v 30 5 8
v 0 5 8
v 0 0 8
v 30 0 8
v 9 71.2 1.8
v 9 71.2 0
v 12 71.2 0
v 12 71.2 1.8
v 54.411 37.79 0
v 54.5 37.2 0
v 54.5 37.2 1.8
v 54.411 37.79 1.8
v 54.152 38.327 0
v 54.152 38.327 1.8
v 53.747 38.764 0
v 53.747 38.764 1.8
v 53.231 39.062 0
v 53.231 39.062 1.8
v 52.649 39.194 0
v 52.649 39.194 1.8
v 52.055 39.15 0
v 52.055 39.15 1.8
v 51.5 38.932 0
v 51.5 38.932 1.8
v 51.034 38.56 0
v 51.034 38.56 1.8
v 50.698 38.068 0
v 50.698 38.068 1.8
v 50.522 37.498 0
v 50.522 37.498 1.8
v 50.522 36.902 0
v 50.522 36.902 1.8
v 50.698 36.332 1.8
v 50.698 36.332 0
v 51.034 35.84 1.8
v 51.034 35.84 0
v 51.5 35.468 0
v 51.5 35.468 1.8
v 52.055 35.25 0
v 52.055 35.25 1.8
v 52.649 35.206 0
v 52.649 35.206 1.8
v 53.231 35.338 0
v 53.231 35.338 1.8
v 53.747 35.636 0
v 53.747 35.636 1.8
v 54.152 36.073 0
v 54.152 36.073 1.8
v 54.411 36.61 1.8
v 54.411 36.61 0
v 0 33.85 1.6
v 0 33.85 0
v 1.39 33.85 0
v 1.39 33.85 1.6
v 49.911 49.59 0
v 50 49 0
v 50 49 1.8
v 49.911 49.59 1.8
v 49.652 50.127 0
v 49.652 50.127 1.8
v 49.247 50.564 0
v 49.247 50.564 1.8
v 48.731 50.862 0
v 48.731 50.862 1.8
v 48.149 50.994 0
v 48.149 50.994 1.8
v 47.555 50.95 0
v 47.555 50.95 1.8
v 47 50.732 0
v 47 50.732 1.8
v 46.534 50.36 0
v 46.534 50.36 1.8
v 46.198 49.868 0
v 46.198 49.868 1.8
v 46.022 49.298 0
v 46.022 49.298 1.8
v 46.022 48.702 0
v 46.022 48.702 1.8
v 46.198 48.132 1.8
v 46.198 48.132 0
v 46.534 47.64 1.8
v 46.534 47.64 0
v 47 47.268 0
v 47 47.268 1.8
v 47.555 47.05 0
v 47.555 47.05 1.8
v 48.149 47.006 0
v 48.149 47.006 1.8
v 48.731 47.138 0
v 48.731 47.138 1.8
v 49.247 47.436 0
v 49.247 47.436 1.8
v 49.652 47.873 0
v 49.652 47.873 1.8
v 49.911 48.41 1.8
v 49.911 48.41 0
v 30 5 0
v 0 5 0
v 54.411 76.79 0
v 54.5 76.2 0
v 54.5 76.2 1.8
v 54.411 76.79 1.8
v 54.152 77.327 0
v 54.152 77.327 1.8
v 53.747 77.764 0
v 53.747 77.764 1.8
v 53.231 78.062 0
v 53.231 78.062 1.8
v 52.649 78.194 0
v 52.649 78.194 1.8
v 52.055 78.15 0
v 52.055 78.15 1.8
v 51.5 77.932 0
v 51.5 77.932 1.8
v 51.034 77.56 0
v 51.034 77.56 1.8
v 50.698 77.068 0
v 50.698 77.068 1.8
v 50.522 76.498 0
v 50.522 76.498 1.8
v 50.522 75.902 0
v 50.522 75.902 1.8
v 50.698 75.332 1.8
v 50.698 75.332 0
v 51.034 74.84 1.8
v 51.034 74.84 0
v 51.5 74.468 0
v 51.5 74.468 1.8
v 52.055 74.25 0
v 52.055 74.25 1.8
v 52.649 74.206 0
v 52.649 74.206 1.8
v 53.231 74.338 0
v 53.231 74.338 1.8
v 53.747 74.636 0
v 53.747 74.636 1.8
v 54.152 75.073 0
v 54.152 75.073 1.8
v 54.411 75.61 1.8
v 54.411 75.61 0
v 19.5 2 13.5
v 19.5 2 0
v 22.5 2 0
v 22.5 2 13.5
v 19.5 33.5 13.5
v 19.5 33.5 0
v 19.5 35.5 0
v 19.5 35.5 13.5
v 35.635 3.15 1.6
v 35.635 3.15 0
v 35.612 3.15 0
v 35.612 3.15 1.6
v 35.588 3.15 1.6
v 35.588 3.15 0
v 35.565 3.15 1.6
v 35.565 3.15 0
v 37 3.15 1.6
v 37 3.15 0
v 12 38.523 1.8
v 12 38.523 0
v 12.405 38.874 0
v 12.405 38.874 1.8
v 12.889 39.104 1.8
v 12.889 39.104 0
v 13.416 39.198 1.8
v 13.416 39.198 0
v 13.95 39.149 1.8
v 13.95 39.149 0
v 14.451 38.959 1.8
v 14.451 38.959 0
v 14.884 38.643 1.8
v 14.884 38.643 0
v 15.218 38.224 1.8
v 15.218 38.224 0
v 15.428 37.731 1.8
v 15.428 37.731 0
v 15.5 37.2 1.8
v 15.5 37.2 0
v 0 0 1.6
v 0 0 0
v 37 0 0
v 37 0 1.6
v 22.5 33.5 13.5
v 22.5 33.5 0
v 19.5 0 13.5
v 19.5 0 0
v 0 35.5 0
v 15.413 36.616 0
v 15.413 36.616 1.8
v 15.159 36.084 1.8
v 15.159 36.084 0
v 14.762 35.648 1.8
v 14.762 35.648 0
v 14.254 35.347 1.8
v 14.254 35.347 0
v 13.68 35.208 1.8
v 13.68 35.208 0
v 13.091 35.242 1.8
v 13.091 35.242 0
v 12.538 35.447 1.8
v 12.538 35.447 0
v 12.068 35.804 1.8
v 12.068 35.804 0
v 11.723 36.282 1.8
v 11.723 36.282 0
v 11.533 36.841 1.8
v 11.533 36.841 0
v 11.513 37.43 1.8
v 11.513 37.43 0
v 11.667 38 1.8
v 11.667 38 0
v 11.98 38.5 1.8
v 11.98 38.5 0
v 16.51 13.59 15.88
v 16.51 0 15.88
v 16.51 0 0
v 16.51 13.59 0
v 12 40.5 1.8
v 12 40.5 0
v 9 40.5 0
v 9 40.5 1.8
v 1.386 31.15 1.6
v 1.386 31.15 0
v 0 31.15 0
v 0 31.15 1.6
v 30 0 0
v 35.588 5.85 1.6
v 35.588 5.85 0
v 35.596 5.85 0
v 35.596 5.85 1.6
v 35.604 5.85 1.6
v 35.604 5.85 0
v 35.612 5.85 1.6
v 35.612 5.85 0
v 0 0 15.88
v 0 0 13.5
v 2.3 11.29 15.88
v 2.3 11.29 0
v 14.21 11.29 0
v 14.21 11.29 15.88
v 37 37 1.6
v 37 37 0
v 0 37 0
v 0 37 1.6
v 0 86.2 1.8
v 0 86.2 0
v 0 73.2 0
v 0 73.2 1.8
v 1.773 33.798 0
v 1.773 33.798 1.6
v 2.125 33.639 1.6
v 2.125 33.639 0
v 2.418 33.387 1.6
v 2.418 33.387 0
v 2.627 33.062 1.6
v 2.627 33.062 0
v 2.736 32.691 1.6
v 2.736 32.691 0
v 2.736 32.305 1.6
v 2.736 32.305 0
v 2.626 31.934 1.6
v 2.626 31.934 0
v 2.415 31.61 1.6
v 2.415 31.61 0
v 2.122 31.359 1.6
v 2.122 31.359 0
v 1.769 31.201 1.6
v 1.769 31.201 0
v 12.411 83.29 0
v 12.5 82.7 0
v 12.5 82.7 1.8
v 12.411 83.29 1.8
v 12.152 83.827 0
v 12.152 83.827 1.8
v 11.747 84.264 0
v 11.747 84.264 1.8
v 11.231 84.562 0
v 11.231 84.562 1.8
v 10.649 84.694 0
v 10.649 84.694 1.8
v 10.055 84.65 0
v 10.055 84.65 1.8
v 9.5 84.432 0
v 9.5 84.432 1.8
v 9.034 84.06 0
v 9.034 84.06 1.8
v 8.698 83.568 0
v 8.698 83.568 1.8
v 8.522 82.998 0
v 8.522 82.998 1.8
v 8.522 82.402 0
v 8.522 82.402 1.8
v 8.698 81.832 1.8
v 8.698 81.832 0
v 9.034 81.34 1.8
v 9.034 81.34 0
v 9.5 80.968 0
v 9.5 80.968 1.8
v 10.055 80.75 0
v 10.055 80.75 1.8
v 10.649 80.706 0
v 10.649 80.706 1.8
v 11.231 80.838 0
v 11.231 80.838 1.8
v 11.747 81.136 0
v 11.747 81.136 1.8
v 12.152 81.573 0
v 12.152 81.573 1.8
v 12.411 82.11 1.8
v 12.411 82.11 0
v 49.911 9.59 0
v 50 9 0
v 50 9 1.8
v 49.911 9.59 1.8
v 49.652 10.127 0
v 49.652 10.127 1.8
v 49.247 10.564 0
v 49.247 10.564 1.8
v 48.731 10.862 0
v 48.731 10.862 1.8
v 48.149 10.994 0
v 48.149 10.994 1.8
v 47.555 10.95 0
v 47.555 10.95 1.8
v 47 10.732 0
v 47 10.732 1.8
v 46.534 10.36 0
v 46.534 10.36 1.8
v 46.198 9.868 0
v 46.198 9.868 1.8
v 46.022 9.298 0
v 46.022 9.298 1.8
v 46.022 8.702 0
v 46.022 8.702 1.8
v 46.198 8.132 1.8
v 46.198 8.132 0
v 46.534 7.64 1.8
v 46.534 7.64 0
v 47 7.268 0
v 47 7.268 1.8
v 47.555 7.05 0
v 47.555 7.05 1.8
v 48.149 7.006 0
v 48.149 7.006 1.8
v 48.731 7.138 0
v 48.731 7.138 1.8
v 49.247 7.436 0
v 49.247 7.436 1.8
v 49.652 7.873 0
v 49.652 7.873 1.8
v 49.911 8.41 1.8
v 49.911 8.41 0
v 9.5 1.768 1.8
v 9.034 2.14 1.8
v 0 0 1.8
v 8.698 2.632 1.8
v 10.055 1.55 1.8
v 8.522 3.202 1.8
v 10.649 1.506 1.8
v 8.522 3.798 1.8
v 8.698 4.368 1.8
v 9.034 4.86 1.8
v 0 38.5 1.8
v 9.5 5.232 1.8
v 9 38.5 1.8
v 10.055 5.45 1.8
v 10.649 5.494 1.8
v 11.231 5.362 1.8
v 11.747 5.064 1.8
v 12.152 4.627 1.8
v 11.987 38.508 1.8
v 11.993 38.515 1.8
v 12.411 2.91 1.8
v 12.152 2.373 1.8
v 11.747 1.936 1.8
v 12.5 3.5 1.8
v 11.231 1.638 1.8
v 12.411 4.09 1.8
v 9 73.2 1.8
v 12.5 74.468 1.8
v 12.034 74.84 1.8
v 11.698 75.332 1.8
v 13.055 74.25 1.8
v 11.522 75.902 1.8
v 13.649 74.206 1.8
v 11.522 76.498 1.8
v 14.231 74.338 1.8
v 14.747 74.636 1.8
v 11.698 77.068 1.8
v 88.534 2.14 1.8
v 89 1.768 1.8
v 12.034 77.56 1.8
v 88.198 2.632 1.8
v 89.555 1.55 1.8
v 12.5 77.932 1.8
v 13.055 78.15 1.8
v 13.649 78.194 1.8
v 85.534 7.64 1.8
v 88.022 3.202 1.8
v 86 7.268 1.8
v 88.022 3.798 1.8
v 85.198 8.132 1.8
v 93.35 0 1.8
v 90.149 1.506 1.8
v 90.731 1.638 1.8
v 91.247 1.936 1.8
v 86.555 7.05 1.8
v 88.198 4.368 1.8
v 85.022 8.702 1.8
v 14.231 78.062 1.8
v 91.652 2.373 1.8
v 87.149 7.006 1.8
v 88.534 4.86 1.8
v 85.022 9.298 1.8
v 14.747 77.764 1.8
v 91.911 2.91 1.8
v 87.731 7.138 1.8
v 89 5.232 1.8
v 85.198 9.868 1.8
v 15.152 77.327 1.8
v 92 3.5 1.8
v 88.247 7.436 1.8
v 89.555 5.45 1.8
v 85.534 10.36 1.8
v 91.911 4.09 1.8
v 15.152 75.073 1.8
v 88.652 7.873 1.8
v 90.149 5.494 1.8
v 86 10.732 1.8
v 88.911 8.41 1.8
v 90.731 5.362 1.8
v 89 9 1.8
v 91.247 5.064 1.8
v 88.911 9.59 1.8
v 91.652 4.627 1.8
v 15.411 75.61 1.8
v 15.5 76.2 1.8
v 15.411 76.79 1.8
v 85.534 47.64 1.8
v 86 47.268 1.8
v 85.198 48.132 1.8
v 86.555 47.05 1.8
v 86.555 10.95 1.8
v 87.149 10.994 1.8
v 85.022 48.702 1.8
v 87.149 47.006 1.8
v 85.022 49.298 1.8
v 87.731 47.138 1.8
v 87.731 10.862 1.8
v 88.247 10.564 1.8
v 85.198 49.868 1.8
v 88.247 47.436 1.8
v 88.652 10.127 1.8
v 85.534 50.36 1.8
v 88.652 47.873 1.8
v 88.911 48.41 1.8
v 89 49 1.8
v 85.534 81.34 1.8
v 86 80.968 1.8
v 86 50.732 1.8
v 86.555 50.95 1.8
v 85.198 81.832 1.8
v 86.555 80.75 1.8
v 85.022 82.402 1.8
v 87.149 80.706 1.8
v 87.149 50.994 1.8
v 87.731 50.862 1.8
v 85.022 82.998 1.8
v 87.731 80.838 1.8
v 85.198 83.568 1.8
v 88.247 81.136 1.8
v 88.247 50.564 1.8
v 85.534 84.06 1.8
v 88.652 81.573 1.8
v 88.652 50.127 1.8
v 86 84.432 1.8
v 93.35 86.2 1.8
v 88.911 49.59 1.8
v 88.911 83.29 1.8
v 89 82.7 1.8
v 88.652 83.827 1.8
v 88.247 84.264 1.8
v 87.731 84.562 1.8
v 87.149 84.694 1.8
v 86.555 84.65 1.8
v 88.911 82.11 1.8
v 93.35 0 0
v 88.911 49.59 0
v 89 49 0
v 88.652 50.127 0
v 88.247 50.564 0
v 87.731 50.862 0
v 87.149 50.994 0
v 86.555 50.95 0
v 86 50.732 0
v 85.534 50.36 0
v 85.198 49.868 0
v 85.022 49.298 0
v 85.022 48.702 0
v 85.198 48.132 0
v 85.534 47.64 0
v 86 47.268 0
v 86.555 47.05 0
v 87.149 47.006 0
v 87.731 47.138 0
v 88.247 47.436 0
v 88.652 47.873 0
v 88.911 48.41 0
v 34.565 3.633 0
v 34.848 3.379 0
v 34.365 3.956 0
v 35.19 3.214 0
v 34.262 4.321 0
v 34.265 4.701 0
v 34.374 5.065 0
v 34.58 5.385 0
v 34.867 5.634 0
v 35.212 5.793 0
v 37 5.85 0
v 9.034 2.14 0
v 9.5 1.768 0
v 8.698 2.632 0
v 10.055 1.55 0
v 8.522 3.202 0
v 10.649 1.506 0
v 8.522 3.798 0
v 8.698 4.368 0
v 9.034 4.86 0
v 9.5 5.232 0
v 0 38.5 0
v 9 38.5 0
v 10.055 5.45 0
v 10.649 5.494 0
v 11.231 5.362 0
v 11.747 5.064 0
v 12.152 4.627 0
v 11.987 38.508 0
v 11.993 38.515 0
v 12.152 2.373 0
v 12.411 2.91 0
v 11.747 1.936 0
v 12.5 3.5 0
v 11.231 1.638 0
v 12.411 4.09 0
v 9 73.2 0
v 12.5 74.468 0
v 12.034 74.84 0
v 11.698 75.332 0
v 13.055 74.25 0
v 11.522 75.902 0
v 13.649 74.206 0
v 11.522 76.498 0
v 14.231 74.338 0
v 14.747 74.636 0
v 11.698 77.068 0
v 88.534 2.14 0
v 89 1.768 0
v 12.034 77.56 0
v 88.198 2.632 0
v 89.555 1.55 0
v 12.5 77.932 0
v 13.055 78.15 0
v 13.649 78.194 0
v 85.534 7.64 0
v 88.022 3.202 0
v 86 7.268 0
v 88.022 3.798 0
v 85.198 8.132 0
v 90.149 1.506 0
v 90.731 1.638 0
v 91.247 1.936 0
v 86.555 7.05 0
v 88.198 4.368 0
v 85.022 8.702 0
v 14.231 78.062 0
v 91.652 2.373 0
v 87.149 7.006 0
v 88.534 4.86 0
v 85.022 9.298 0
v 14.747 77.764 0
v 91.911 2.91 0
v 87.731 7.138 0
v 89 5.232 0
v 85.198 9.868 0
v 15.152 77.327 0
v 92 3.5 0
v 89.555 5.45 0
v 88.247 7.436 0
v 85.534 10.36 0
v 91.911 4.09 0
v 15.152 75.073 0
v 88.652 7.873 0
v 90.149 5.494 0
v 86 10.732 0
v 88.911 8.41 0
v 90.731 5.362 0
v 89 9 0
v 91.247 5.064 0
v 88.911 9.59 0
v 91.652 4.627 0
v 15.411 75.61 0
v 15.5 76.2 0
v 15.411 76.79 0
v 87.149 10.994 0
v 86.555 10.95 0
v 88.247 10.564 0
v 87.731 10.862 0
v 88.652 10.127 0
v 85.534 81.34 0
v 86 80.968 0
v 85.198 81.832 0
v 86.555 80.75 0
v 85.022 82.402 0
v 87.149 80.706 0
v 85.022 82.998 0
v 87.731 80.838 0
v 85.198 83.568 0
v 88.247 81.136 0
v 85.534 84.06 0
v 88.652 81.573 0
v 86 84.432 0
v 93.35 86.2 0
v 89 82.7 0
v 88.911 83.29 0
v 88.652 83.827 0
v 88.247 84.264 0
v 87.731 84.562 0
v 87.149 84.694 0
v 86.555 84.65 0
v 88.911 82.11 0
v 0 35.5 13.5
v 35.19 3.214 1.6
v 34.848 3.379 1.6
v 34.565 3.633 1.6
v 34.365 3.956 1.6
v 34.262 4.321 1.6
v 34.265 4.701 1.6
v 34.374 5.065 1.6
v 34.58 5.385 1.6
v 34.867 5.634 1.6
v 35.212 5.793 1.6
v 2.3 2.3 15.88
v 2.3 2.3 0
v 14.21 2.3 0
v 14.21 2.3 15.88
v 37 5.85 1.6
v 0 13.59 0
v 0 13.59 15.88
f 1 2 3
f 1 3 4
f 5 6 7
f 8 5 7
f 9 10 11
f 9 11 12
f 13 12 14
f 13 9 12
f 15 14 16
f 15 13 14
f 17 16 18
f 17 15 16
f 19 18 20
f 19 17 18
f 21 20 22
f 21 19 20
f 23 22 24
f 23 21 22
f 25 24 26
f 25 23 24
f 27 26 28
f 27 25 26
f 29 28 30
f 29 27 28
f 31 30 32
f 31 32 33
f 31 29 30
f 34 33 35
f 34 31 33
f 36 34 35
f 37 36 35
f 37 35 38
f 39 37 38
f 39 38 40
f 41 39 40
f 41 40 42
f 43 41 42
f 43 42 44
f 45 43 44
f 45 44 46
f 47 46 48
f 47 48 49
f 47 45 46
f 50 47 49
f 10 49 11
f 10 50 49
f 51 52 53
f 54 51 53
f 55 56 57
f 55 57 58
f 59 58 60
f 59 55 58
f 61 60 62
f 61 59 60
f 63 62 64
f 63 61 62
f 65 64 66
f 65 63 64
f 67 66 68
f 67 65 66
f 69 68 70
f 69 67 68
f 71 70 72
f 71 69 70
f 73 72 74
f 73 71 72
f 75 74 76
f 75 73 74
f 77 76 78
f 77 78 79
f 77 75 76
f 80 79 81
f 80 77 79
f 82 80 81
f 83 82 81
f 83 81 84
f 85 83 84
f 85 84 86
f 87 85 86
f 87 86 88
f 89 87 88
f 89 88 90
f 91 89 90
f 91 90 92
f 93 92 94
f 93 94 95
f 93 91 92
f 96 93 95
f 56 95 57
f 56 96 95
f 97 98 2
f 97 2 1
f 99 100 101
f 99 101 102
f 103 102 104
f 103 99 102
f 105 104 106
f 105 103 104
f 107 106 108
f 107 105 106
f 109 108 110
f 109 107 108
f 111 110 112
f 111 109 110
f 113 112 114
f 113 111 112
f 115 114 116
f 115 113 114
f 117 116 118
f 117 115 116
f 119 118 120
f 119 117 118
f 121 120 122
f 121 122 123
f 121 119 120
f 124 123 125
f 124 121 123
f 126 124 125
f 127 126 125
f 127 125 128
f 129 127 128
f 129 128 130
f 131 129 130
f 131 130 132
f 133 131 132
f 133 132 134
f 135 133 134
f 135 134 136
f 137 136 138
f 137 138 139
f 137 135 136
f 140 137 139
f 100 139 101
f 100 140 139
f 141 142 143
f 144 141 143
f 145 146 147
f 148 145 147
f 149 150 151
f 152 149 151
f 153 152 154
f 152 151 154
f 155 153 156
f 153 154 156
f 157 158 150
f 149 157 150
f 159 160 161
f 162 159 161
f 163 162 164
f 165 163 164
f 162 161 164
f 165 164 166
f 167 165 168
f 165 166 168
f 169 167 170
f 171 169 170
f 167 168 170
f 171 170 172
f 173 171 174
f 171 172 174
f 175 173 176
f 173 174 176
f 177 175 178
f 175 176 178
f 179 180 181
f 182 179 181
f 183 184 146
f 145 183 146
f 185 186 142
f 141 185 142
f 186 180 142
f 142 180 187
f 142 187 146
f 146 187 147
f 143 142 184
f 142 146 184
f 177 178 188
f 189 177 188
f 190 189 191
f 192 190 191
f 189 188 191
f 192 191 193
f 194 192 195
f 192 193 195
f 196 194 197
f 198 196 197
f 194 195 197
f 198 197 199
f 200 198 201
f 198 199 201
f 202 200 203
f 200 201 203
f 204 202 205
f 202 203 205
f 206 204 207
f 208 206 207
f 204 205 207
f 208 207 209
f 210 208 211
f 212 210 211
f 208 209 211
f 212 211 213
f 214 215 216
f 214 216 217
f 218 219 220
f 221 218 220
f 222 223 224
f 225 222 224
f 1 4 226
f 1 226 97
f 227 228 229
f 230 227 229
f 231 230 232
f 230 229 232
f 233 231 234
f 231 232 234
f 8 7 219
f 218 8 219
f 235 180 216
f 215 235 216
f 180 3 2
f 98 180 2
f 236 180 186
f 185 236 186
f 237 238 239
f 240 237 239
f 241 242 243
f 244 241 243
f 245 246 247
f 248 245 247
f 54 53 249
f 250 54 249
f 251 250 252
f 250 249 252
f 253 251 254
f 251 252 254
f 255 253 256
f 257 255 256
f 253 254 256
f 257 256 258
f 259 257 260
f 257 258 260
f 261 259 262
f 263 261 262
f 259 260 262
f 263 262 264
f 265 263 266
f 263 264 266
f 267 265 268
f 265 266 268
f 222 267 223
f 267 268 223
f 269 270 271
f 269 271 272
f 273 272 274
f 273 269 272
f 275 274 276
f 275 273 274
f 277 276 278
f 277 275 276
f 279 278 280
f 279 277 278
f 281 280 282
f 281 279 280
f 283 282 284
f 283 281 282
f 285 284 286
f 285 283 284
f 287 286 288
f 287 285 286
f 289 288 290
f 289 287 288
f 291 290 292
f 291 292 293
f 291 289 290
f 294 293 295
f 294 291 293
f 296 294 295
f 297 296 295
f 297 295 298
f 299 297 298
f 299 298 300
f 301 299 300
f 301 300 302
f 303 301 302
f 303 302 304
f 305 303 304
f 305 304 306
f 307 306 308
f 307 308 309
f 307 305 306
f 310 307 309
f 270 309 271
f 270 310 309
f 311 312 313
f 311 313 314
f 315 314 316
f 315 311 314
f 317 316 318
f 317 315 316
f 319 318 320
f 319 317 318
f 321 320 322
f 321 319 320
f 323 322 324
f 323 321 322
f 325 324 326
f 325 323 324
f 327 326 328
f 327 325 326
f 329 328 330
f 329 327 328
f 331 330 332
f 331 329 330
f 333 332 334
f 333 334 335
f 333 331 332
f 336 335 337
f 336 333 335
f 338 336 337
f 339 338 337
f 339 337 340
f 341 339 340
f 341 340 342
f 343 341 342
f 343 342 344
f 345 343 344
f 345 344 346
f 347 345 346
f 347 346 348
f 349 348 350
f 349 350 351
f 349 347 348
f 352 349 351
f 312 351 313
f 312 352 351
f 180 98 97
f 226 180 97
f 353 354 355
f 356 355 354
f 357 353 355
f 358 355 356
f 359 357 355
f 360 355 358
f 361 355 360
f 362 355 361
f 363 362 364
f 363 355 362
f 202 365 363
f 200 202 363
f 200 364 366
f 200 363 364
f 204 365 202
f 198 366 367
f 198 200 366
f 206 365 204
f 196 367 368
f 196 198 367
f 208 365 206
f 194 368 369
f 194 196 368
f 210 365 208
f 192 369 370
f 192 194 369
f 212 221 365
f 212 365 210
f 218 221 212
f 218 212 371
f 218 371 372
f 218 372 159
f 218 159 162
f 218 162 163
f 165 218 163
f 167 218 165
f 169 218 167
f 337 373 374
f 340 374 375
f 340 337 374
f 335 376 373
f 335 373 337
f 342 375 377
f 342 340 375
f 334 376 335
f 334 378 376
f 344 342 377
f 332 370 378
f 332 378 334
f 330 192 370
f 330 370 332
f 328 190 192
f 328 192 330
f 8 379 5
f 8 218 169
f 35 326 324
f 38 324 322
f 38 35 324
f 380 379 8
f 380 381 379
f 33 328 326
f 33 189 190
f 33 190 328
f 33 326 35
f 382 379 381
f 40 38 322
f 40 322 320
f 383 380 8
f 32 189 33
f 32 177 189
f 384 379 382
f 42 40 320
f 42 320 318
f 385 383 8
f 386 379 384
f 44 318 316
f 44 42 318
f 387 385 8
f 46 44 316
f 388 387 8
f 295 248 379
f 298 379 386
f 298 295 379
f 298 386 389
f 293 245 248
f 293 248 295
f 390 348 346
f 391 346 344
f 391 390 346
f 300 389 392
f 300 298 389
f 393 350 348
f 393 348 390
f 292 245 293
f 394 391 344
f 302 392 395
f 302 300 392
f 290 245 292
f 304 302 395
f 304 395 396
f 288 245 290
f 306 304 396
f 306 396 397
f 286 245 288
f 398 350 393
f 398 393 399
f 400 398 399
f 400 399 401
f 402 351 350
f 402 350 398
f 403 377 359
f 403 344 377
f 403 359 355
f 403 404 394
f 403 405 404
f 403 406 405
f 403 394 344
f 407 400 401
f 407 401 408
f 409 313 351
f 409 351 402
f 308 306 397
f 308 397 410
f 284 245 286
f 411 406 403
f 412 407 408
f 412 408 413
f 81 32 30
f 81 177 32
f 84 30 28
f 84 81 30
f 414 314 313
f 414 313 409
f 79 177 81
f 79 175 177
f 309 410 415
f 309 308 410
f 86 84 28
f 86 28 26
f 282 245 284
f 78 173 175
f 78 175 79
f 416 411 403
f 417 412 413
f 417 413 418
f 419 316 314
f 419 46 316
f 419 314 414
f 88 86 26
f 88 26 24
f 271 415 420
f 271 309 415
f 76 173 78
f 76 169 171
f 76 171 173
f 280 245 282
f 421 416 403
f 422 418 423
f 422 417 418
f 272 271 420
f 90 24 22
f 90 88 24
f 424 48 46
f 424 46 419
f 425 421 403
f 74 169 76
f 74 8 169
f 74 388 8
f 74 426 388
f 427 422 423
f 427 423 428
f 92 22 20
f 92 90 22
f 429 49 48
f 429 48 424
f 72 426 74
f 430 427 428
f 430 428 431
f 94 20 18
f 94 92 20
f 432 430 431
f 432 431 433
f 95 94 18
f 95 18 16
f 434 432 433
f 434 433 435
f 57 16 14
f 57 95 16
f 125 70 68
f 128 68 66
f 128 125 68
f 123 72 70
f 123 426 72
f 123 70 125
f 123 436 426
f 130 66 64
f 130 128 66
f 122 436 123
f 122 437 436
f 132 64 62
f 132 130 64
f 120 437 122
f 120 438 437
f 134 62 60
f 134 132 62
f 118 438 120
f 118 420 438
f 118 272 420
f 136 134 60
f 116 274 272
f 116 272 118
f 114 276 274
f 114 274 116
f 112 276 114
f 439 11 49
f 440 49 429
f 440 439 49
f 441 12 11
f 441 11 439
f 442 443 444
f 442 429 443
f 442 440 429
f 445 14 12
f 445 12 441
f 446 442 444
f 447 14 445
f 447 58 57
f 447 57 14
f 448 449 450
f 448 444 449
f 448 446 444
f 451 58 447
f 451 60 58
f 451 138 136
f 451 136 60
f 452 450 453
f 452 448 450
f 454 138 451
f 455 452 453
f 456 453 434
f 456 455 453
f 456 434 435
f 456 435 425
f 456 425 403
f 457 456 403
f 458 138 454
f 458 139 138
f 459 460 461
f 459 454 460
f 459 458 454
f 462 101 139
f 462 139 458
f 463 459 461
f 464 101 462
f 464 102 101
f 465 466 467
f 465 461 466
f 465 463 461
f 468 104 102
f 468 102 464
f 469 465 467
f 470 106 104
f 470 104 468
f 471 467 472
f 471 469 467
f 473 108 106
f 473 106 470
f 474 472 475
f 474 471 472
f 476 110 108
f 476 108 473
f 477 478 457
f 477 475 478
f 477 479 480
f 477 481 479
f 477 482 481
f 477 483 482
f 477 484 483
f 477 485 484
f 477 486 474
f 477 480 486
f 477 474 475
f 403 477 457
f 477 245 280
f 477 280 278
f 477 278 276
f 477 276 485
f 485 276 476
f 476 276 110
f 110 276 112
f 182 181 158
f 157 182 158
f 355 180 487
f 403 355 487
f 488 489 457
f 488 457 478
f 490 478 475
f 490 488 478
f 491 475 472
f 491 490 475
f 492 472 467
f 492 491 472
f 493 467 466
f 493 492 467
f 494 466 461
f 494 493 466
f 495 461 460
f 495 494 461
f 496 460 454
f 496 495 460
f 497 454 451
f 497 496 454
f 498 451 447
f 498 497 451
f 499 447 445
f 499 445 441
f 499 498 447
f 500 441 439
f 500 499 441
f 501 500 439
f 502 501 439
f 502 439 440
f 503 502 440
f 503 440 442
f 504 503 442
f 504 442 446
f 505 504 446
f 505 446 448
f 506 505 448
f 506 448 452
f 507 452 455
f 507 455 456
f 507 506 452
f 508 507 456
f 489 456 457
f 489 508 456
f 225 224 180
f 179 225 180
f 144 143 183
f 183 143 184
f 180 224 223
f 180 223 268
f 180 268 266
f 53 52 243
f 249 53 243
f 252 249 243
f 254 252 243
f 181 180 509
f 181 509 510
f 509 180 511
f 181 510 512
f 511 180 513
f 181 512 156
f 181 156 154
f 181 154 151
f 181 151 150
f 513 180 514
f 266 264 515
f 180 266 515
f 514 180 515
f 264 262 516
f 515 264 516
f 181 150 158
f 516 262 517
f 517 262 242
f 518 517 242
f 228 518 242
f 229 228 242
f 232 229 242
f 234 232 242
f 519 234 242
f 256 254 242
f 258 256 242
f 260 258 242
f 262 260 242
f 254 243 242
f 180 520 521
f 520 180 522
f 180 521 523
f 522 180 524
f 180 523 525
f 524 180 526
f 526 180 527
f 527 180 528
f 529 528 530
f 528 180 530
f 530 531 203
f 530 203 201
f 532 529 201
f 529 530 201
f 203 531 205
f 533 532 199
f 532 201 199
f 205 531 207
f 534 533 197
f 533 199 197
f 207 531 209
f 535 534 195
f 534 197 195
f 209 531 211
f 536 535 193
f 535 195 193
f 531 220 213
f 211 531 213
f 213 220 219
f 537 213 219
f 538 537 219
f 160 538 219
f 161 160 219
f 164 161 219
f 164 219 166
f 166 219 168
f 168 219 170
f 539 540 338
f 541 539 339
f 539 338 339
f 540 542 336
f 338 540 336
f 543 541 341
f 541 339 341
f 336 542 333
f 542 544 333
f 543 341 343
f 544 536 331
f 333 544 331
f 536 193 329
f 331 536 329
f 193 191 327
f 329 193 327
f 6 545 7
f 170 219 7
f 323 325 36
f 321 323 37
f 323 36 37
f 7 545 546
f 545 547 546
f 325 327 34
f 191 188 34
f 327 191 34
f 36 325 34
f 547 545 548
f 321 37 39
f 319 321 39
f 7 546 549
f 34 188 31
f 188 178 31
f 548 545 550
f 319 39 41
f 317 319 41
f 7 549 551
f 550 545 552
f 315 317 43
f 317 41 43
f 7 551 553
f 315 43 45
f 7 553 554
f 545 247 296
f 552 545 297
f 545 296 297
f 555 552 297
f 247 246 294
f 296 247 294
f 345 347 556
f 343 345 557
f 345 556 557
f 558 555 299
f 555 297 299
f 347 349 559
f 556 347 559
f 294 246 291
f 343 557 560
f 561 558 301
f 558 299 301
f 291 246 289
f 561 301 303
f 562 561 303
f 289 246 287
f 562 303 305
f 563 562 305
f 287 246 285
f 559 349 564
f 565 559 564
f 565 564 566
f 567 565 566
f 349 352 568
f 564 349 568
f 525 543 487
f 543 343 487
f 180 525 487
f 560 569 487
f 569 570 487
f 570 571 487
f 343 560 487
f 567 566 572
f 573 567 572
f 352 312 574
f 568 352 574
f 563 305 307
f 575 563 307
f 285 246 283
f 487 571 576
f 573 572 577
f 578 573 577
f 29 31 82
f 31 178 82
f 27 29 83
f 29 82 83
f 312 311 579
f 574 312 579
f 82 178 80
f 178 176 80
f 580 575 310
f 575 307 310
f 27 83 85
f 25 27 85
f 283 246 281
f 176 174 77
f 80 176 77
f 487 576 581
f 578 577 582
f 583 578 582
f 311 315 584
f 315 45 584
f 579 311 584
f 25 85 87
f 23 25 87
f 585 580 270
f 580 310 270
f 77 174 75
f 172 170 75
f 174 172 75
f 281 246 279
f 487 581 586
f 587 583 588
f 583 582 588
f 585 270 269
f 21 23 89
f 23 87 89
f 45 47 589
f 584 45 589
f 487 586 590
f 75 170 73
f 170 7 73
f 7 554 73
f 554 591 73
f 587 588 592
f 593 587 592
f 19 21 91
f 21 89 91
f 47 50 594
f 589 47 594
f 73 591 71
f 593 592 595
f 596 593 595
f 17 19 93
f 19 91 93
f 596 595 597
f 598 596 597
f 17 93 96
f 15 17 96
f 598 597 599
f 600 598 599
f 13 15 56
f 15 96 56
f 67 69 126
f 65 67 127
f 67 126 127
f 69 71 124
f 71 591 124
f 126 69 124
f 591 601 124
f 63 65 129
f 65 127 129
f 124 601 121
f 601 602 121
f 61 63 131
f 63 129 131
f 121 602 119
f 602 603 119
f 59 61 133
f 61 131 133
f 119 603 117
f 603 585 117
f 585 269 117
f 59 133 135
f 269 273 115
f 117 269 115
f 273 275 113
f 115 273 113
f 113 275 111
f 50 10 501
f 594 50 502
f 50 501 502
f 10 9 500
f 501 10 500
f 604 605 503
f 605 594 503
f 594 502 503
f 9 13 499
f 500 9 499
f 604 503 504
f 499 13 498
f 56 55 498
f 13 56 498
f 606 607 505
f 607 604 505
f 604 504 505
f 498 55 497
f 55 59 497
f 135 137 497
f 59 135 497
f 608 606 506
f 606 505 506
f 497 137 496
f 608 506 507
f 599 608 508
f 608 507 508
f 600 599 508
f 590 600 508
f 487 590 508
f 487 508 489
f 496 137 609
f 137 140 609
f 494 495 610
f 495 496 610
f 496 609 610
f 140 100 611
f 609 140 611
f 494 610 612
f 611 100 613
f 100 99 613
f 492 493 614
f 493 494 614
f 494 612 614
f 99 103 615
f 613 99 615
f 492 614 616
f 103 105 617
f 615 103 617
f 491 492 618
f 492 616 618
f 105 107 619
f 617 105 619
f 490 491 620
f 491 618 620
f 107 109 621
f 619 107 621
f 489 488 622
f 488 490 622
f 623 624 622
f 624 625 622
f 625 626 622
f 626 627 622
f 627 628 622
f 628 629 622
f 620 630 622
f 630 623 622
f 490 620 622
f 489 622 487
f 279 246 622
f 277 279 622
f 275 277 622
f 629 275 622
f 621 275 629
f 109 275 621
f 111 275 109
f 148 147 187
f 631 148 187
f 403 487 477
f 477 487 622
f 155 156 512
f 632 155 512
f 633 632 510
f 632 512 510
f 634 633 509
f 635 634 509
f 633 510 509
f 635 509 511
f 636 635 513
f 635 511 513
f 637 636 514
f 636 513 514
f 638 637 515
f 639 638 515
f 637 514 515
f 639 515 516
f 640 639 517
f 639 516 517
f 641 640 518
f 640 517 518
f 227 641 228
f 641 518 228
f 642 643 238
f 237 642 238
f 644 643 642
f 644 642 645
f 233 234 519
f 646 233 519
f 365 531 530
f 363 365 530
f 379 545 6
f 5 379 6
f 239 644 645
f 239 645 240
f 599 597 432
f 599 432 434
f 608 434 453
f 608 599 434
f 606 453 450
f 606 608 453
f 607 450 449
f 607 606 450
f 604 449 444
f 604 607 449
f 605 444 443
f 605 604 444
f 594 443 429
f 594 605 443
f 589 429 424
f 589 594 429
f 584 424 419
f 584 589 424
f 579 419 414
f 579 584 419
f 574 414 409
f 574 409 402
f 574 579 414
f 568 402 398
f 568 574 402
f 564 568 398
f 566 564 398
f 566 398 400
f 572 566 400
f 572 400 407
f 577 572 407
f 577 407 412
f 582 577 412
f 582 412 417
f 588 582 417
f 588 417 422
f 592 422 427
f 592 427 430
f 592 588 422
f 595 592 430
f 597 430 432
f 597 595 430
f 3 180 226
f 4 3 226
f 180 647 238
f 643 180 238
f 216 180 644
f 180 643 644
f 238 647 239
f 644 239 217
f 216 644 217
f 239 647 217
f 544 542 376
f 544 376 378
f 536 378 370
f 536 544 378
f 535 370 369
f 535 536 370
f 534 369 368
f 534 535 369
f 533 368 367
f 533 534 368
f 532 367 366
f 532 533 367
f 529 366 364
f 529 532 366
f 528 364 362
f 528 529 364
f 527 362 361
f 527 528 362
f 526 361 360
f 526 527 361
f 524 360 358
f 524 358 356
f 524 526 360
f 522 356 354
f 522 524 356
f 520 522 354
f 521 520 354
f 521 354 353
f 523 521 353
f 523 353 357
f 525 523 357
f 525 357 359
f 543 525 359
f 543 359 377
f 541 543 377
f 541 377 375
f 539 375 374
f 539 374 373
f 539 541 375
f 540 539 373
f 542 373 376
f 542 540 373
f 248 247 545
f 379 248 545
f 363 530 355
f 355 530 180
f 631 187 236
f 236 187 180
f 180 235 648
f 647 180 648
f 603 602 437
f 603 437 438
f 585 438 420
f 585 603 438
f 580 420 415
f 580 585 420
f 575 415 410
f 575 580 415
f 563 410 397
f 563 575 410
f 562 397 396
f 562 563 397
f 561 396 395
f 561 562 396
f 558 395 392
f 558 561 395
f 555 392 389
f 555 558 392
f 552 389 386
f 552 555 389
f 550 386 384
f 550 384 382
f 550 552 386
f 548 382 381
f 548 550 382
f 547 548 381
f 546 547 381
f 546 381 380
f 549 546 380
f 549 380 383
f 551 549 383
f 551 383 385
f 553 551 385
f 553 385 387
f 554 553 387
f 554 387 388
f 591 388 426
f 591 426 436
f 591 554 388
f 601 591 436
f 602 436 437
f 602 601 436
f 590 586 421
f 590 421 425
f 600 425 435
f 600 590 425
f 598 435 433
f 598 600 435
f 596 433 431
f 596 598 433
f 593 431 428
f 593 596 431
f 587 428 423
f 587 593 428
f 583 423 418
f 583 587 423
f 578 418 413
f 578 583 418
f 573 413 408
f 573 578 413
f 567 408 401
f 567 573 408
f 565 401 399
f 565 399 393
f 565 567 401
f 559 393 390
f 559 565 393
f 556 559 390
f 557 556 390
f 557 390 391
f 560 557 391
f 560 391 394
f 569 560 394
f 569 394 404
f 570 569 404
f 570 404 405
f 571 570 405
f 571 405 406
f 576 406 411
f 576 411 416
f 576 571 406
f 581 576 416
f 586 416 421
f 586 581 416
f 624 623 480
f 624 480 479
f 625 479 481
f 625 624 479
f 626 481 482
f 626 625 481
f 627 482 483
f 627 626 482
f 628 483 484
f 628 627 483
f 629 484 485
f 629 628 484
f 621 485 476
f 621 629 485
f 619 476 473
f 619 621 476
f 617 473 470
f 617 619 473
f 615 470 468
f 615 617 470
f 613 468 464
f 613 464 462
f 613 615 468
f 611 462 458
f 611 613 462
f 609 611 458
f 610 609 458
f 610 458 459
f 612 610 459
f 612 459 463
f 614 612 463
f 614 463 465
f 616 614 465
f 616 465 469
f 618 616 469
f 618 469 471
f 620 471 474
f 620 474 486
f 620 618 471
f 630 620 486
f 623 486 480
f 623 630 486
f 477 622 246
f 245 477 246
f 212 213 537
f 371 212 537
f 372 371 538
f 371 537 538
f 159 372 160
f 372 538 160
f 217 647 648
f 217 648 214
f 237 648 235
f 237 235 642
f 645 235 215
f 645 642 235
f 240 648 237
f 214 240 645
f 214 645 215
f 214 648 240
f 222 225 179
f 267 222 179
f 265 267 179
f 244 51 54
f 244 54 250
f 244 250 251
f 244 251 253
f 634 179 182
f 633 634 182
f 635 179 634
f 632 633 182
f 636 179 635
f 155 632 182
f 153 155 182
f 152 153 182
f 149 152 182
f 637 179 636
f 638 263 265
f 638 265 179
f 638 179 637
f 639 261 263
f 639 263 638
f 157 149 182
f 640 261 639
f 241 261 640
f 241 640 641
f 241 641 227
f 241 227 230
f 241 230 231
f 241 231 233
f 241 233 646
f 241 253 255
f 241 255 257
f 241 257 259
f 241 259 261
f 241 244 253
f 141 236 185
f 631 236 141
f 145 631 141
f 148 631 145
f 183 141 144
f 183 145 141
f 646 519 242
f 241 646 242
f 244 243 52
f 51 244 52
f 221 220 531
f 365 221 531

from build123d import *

# Parameters (mm, degrees)
F1_DEPTH = 1.6
F2_W     = 30
F2_H     = 5
F3_DEPTH = 8
F4_R     = 2
F5_DEPTH = 1.8
F7_DEPTH = 13.5
F8_W     = 16.51
F8_H     = 13.59
F8_W_2   = 11.9099998979
F8_H_2   = 8.9899998979
F9_DEPTH = 15.88


with BuildPart() as f1:
    # F0 (on Top) → F1 (new body)
    with BuildSketch(Plane.XY):
        with BuildLine():
            Line((0, 31.1500756876), (0, 0))
            Line((0, 0), (37, 0))
            Line((37, 0), (37, 3.1504611653))
            Line((37, 3.1504611653), (35.6352836186, 3.1504611653))
            ThreePointArc((35.6352836186, 3.1504611653), (35.6, 3.15), (35.5647163814, 3.1504611653))
            ThreePointArc((35.5647163814, 3.1504611653), (34.250048561, 4.5114504264), (35.5876136644, 5.8499431761))
            ThreePointArc((35.5876136644, 5.8499431761), (35.6, 5.85), (35.6123863356, 5.8499431761))
            Line((35.6123863356, 5.8499431761), (37, 5.8499431761))
            Line((37, 5.8499431761), (37, 37))
            Line((37, 37), (0, 37))
            Line((0, 37), (0, 33.8499615507))
            Line((0, 33.8499615507), (1.3898111945, 33.8499615507))
            ThreePointArc((1.3898111945, 33.8499615507), (2.7499984386, 32.4979467523), (1.385704868, 31.1500756876))
            Line((1.385704868, 31.1500756876), (0, 31.1500756876))
        make_face()
    extrude(amount=F1_DEPTH)


with BuildPart() as f3:
    # F2 (on Top) → F3 (new body)
    with BuildSketch(Plane.XY):
        with Locations((15, 2.5)):
            Rectangle(F2_W, F2_H)
    extrude(amount=F3_DEPTH)


with BuildPart() as f5:
    # F4 (on Top) → F5 (new body)
    with BuildSketch(Plane.XY):
        Polygon((0, 38.5), (0, 0), (93.35, 0), (93.35, 86.2), (0, 86.2), (0, 73.2), (9, 73.2), (9, 71.2), (12, 71.2), (12, 40.5), (9, 40.5), (9, 38.5), align=None)
        with Locations((10.5, 3.5)):
            Circle(F4_R, mode=Mode.SUBTRACT)
        with BuildLine():
            ThreePointArc((12, 38.5228756555), (14.2071067812, 39.0708286934), (15.5, 37.2))
            ThreePointArc((15.5, 37.2), (12.8070847204, 35.3238687638), (11.9801315846, 38.5))
            ThreePointArc((11.9801315846, 38.5), (11.9900224719, 38.5114754533), (12, 38.5228756555))
        make_face(mode=Mode.SUBTRACT)
        with Locations((48, 9)):
            Circle(F4_R, mode=Mode.SUBTRACT)
        with Locations((90, 3.5)):
            Circle(F4_R, mode=Mode.SUBTRACT)
        with Locations((87, 9)):
            Circle(F4_R, mode=Mode.SUBTRACT)
        with Locations((52.5, 37.2)):
            Circle(F4_R, mode=Mode.SUBTRACT)
        with Locations((10.5, 82.7)):
            Circle(F4_R, mode=Mode.SUBTRACT)
        with Locations((13.5, 76.2)):
            Circle(F4_R, mode=Mode.SUBTRACT)
        with Locations((48, 49)):
            Circle(F4_R, mode=Mode.SUBTRACT)
        with Locations((87, 49)):
            Circle(F4_R, mode=Mode.SUBTRACT)
        with Locations((52.5, 76.2)):
            Circle(F4_R, mode=Mode.SUBTRACT)
        with Locations((87, 82.7)):
            Circle(F4_R, mode=Mode.SUBTRACT)
    extrude(amount=F5_DEPTH)


with BuildPart() as f7:
    # F6 (on Top) → F7 (new body)
    with BuildSketch(Plane.XY):
        Polygon((0, 35.5), (0, 0), (19.5, 0), (19.5, 2), (22.5, 2), (22.5, 33.5), (19.5, 33.5), (19.5, 35.5), align=None)
    extrude(amount=F7_DEPTH)


with BuildPart() as f9:
    # F8 (on Top) → F9 (new body)
    with BuildSketch(Plane.XY):
        with Locations((8.255, 6.795)):
            Rectangle(F8_W, F8_H)
        with Locations((8.255, 6.795)):
            Rectangle(F8_W_2, F8_H_2, mode=Mode.SUBTRACT)
    extrude(amount=F9_DEPTH)


solid = Compound([f1.part, f3.part, f5.part, f7.part, f9.part])
